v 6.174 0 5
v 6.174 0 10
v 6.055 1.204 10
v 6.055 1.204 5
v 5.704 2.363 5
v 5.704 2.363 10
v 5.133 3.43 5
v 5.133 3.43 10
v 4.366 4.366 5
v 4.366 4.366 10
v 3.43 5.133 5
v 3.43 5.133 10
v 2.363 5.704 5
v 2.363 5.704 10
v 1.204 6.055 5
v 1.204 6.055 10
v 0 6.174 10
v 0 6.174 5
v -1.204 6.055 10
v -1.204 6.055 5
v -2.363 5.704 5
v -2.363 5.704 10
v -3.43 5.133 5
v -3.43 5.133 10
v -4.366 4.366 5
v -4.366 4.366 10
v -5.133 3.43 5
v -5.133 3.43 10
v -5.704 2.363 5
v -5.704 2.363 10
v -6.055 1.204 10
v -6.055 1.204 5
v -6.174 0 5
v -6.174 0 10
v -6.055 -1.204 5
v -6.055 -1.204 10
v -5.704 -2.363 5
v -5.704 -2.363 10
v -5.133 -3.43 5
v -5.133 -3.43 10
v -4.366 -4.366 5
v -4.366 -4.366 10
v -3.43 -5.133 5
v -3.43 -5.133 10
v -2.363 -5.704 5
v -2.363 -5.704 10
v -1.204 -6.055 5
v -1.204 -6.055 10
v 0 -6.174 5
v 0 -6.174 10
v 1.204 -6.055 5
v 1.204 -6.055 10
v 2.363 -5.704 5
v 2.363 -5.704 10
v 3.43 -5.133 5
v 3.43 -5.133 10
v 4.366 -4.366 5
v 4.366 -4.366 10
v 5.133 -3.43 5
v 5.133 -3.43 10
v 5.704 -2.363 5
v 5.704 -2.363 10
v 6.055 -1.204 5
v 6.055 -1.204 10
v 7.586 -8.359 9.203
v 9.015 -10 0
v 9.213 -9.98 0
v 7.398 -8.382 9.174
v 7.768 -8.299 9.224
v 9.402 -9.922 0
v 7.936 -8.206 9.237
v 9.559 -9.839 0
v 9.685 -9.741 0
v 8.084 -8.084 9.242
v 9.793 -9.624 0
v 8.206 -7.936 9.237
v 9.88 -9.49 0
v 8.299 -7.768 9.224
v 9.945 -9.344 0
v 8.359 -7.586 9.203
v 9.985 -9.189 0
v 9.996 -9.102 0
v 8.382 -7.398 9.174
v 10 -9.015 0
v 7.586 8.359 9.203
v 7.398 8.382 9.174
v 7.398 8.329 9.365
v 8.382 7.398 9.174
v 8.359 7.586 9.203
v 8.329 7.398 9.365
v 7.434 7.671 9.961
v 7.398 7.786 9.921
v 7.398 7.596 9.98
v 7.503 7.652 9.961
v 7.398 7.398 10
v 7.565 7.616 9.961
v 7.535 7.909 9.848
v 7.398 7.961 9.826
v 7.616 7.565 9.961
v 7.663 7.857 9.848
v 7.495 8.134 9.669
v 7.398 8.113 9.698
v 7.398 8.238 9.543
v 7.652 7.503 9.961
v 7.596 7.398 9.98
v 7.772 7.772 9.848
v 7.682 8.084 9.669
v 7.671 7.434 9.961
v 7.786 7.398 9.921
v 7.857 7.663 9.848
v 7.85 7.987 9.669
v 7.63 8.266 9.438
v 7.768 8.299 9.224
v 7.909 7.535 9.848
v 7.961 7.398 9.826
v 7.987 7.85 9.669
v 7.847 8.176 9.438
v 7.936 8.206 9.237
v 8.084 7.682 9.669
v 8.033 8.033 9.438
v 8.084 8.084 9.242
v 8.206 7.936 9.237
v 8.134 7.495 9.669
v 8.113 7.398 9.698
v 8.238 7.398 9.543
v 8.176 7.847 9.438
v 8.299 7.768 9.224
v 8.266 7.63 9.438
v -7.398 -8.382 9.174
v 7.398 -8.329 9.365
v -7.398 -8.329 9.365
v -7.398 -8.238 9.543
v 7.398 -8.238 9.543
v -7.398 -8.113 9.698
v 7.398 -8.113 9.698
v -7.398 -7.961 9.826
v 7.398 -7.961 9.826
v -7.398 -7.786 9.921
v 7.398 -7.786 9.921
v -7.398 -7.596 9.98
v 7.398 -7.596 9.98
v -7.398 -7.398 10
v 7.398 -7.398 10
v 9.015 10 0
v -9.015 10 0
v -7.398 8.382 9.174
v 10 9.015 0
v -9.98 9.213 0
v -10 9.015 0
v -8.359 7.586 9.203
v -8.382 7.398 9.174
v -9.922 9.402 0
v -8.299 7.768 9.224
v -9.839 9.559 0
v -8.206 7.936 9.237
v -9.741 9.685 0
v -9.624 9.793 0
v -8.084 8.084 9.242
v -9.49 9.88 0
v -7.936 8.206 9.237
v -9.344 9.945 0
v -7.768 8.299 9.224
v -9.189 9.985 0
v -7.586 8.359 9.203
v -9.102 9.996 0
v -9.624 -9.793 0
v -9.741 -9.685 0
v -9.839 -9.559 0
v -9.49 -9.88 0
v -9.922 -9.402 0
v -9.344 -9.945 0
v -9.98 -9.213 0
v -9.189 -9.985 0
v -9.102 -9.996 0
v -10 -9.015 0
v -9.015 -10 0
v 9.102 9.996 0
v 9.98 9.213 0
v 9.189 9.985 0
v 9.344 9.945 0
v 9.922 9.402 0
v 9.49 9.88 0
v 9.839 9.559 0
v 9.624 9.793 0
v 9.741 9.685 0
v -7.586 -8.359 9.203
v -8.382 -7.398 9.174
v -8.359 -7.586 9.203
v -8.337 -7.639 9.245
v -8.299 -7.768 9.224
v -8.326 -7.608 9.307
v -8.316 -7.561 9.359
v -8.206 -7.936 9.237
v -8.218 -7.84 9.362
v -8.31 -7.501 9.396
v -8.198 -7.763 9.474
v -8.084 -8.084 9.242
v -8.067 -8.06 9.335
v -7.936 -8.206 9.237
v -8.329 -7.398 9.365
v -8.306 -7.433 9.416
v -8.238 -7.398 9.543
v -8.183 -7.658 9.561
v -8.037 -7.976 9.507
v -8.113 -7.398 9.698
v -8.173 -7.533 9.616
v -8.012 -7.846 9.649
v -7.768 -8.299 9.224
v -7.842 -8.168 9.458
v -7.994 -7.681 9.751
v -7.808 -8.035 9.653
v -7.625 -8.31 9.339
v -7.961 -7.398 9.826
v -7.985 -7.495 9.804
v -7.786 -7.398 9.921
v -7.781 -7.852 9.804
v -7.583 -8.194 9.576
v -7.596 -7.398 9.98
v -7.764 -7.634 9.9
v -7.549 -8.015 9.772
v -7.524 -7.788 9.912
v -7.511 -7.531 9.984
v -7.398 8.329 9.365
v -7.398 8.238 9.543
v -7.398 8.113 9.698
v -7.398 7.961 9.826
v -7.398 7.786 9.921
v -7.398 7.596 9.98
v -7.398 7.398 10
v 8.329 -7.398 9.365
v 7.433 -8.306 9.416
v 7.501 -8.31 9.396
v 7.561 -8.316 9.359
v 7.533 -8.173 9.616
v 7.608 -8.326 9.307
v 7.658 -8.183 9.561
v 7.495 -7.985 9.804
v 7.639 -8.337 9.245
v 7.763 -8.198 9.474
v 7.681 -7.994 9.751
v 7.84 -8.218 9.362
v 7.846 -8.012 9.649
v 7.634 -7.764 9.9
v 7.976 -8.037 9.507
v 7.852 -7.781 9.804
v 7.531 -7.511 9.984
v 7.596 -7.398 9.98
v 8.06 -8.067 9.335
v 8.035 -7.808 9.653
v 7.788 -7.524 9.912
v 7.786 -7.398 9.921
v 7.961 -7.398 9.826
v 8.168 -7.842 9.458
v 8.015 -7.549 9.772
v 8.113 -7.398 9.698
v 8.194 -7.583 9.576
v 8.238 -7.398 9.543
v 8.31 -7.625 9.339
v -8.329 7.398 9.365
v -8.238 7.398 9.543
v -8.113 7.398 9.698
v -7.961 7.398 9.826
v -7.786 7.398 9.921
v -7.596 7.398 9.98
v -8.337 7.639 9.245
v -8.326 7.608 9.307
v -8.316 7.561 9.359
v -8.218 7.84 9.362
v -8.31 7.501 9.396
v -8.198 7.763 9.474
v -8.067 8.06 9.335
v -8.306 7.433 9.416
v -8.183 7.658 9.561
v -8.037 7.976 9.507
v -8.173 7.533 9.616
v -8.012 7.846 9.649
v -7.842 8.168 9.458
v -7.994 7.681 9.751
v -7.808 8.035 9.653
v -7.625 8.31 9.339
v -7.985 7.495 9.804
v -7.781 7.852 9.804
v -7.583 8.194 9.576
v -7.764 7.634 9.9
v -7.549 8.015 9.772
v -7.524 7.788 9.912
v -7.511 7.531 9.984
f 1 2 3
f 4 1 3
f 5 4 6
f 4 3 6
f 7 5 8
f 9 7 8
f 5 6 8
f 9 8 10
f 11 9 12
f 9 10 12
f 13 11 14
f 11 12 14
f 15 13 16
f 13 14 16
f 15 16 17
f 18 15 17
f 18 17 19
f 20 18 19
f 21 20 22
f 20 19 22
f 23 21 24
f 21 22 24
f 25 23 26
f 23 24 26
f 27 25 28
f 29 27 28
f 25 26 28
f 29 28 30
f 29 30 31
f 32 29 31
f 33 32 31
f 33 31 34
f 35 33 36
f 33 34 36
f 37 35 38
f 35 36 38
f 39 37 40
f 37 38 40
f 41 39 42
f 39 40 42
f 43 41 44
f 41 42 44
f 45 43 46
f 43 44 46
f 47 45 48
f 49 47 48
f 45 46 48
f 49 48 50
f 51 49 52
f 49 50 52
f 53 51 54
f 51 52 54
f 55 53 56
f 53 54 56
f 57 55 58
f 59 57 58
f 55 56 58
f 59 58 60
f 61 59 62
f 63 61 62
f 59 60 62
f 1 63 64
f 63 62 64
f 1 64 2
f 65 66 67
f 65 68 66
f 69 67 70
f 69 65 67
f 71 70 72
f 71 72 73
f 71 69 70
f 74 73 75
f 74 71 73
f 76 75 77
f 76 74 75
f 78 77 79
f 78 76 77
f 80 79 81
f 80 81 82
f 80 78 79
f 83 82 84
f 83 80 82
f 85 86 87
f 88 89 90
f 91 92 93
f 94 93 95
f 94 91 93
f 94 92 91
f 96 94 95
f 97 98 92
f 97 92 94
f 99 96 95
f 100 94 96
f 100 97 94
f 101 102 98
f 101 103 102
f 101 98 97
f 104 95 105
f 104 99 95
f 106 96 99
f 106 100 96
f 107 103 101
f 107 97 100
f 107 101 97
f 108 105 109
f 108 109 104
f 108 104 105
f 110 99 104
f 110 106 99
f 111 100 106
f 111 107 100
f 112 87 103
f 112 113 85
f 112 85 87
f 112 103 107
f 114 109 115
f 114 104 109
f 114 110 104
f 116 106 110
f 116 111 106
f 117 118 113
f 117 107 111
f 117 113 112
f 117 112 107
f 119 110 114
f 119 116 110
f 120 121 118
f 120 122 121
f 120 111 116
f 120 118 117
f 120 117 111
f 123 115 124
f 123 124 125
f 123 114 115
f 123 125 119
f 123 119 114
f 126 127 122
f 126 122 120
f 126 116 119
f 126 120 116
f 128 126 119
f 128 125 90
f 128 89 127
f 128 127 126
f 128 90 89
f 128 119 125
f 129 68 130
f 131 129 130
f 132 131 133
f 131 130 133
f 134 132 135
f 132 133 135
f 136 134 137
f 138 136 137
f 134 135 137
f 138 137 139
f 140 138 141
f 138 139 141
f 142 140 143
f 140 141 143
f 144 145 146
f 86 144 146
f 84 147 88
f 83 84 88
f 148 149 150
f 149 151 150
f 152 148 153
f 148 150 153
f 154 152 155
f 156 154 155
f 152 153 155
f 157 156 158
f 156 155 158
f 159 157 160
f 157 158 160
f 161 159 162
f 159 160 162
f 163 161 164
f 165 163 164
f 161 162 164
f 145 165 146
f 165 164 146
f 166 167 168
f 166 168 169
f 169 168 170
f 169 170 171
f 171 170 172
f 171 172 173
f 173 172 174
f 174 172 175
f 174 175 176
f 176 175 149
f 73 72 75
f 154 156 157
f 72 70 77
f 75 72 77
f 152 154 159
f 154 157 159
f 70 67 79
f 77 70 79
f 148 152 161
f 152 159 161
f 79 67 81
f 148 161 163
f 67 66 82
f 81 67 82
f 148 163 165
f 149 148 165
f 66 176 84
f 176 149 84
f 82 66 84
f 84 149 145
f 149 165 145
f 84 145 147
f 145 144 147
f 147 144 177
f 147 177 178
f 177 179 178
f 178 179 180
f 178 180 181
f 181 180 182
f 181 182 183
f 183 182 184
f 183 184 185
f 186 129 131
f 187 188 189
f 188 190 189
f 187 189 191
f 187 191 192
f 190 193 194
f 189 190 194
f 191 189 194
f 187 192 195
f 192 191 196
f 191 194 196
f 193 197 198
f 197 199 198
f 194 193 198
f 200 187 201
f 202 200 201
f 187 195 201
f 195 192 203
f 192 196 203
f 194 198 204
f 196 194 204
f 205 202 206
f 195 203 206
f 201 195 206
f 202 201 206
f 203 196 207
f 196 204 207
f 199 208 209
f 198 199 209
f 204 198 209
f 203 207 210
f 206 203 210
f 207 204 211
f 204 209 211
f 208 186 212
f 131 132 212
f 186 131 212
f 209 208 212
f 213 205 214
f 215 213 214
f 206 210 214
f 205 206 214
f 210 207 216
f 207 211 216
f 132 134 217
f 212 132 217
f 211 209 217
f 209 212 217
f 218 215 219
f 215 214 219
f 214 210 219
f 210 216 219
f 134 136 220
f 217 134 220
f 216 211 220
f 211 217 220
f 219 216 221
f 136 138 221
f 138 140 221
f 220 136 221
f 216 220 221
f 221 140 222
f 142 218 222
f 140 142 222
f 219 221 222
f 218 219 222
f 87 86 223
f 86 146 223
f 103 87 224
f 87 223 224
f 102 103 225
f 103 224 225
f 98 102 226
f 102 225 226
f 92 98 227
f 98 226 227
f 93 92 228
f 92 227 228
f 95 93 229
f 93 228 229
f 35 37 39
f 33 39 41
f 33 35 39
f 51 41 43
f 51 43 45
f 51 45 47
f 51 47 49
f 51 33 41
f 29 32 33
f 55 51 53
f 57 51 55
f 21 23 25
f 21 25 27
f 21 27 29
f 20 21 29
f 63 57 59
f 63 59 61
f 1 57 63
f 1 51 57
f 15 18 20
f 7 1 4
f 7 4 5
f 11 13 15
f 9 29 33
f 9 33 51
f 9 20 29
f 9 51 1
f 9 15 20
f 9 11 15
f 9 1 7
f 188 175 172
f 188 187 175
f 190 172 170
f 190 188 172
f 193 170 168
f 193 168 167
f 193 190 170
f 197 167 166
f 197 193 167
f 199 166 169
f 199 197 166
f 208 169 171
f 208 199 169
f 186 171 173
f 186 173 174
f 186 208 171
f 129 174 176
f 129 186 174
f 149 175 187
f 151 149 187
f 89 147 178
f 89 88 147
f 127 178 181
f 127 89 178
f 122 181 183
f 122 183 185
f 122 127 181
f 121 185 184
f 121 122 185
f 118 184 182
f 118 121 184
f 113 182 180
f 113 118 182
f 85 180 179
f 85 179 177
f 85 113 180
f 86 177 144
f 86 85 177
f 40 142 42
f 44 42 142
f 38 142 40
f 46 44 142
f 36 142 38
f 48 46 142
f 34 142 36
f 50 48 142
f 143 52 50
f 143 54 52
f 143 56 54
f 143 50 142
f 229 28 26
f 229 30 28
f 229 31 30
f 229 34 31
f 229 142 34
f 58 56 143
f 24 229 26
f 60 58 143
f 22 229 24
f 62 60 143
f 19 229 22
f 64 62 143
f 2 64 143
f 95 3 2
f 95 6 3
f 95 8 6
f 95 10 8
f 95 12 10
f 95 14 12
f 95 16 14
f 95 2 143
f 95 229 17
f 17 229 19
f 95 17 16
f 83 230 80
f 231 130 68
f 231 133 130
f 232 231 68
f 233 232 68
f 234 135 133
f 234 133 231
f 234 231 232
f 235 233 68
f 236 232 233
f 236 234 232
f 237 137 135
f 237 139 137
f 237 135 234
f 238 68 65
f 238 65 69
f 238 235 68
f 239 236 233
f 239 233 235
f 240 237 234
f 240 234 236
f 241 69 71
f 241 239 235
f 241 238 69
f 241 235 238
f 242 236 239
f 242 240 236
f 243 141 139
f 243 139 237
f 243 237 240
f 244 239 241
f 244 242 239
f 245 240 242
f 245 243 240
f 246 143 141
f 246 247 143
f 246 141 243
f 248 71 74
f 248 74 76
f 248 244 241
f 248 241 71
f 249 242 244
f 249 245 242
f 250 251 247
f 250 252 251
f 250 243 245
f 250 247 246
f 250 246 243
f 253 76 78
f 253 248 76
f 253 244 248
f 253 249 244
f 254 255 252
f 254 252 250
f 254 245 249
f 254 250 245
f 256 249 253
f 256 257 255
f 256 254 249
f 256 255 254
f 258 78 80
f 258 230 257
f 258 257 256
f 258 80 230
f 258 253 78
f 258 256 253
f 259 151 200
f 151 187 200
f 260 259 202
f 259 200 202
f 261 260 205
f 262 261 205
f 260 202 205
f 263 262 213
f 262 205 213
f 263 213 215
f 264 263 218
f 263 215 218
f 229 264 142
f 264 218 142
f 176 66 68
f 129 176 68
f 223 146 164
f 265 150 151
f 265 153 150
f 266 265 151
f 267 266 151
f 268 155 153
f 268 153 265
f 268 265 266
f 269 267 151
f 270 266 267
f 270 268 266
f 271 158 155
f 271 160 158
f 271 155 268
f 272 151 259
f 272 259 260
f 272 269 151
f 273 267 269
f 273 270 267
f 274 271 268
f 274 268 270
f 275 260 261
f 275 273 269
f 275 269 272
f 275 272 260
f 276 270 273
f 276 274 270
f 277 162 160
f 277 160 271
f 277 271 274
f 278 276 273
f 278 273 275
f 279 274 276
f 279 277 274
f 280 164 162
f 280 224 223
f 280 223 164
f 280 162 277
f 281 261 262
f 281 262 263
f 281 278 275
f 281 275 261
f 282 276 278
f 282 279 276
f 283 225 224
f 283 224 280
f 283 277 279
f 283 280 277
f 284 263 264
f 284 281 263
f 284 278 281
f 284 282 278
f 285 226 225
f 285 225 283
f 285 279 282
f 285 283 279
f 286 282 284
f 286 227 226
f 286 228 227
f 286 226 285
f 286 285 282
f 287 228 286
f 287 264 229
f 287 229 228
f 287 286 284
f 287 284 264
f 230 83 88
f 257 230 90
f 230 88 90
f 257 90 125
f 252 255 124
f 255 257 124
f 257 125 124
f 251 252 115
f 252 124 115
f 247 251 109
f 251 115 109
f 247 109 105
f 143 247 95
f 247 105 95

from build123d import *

# Parameters (mm, degrees)
F0_W     = 20
F0_H     = 20
F1_DEPTH = 10
F1_TAPER = 10
F2_R     = 6.173794391
F3_DEPTH = 5
F4_R     = 1


with BuildPart() as f1:
    # F0 (on Top) → F1 (new body)
    with BuildSketch(Plane.XY):
        Rectangle(F0_W, F0_H)
    extrude(amount=F1_DEPTH, taper=F1_TAPER)

    # F2 (on face) → F3 (cut)
    with BuildSketch(Plane.XY.offset(10)):
        Circle(F2_R)
    extrude(amount=-F3_DEPTH, mode=Mode.SUBTRACT)

    # F4
    f4_edges = [f1.edges().sort_by_distance(p)[0] for p in [
        (9.118365, 9.118365, 5),
        (0, 8.23673, 10),
        (8.23673, 0, 10),
        (-9.118365, 9.118365, 5),
        (0, -8.23673, 10),
        (9.118365, -9.118365, 5),
        (-9.118365, -9.118365, 5),
        (-8.23673, 0, 10),
    ]]
    fillet(f4_edges, radius=F4_R)


solid = f1.part
